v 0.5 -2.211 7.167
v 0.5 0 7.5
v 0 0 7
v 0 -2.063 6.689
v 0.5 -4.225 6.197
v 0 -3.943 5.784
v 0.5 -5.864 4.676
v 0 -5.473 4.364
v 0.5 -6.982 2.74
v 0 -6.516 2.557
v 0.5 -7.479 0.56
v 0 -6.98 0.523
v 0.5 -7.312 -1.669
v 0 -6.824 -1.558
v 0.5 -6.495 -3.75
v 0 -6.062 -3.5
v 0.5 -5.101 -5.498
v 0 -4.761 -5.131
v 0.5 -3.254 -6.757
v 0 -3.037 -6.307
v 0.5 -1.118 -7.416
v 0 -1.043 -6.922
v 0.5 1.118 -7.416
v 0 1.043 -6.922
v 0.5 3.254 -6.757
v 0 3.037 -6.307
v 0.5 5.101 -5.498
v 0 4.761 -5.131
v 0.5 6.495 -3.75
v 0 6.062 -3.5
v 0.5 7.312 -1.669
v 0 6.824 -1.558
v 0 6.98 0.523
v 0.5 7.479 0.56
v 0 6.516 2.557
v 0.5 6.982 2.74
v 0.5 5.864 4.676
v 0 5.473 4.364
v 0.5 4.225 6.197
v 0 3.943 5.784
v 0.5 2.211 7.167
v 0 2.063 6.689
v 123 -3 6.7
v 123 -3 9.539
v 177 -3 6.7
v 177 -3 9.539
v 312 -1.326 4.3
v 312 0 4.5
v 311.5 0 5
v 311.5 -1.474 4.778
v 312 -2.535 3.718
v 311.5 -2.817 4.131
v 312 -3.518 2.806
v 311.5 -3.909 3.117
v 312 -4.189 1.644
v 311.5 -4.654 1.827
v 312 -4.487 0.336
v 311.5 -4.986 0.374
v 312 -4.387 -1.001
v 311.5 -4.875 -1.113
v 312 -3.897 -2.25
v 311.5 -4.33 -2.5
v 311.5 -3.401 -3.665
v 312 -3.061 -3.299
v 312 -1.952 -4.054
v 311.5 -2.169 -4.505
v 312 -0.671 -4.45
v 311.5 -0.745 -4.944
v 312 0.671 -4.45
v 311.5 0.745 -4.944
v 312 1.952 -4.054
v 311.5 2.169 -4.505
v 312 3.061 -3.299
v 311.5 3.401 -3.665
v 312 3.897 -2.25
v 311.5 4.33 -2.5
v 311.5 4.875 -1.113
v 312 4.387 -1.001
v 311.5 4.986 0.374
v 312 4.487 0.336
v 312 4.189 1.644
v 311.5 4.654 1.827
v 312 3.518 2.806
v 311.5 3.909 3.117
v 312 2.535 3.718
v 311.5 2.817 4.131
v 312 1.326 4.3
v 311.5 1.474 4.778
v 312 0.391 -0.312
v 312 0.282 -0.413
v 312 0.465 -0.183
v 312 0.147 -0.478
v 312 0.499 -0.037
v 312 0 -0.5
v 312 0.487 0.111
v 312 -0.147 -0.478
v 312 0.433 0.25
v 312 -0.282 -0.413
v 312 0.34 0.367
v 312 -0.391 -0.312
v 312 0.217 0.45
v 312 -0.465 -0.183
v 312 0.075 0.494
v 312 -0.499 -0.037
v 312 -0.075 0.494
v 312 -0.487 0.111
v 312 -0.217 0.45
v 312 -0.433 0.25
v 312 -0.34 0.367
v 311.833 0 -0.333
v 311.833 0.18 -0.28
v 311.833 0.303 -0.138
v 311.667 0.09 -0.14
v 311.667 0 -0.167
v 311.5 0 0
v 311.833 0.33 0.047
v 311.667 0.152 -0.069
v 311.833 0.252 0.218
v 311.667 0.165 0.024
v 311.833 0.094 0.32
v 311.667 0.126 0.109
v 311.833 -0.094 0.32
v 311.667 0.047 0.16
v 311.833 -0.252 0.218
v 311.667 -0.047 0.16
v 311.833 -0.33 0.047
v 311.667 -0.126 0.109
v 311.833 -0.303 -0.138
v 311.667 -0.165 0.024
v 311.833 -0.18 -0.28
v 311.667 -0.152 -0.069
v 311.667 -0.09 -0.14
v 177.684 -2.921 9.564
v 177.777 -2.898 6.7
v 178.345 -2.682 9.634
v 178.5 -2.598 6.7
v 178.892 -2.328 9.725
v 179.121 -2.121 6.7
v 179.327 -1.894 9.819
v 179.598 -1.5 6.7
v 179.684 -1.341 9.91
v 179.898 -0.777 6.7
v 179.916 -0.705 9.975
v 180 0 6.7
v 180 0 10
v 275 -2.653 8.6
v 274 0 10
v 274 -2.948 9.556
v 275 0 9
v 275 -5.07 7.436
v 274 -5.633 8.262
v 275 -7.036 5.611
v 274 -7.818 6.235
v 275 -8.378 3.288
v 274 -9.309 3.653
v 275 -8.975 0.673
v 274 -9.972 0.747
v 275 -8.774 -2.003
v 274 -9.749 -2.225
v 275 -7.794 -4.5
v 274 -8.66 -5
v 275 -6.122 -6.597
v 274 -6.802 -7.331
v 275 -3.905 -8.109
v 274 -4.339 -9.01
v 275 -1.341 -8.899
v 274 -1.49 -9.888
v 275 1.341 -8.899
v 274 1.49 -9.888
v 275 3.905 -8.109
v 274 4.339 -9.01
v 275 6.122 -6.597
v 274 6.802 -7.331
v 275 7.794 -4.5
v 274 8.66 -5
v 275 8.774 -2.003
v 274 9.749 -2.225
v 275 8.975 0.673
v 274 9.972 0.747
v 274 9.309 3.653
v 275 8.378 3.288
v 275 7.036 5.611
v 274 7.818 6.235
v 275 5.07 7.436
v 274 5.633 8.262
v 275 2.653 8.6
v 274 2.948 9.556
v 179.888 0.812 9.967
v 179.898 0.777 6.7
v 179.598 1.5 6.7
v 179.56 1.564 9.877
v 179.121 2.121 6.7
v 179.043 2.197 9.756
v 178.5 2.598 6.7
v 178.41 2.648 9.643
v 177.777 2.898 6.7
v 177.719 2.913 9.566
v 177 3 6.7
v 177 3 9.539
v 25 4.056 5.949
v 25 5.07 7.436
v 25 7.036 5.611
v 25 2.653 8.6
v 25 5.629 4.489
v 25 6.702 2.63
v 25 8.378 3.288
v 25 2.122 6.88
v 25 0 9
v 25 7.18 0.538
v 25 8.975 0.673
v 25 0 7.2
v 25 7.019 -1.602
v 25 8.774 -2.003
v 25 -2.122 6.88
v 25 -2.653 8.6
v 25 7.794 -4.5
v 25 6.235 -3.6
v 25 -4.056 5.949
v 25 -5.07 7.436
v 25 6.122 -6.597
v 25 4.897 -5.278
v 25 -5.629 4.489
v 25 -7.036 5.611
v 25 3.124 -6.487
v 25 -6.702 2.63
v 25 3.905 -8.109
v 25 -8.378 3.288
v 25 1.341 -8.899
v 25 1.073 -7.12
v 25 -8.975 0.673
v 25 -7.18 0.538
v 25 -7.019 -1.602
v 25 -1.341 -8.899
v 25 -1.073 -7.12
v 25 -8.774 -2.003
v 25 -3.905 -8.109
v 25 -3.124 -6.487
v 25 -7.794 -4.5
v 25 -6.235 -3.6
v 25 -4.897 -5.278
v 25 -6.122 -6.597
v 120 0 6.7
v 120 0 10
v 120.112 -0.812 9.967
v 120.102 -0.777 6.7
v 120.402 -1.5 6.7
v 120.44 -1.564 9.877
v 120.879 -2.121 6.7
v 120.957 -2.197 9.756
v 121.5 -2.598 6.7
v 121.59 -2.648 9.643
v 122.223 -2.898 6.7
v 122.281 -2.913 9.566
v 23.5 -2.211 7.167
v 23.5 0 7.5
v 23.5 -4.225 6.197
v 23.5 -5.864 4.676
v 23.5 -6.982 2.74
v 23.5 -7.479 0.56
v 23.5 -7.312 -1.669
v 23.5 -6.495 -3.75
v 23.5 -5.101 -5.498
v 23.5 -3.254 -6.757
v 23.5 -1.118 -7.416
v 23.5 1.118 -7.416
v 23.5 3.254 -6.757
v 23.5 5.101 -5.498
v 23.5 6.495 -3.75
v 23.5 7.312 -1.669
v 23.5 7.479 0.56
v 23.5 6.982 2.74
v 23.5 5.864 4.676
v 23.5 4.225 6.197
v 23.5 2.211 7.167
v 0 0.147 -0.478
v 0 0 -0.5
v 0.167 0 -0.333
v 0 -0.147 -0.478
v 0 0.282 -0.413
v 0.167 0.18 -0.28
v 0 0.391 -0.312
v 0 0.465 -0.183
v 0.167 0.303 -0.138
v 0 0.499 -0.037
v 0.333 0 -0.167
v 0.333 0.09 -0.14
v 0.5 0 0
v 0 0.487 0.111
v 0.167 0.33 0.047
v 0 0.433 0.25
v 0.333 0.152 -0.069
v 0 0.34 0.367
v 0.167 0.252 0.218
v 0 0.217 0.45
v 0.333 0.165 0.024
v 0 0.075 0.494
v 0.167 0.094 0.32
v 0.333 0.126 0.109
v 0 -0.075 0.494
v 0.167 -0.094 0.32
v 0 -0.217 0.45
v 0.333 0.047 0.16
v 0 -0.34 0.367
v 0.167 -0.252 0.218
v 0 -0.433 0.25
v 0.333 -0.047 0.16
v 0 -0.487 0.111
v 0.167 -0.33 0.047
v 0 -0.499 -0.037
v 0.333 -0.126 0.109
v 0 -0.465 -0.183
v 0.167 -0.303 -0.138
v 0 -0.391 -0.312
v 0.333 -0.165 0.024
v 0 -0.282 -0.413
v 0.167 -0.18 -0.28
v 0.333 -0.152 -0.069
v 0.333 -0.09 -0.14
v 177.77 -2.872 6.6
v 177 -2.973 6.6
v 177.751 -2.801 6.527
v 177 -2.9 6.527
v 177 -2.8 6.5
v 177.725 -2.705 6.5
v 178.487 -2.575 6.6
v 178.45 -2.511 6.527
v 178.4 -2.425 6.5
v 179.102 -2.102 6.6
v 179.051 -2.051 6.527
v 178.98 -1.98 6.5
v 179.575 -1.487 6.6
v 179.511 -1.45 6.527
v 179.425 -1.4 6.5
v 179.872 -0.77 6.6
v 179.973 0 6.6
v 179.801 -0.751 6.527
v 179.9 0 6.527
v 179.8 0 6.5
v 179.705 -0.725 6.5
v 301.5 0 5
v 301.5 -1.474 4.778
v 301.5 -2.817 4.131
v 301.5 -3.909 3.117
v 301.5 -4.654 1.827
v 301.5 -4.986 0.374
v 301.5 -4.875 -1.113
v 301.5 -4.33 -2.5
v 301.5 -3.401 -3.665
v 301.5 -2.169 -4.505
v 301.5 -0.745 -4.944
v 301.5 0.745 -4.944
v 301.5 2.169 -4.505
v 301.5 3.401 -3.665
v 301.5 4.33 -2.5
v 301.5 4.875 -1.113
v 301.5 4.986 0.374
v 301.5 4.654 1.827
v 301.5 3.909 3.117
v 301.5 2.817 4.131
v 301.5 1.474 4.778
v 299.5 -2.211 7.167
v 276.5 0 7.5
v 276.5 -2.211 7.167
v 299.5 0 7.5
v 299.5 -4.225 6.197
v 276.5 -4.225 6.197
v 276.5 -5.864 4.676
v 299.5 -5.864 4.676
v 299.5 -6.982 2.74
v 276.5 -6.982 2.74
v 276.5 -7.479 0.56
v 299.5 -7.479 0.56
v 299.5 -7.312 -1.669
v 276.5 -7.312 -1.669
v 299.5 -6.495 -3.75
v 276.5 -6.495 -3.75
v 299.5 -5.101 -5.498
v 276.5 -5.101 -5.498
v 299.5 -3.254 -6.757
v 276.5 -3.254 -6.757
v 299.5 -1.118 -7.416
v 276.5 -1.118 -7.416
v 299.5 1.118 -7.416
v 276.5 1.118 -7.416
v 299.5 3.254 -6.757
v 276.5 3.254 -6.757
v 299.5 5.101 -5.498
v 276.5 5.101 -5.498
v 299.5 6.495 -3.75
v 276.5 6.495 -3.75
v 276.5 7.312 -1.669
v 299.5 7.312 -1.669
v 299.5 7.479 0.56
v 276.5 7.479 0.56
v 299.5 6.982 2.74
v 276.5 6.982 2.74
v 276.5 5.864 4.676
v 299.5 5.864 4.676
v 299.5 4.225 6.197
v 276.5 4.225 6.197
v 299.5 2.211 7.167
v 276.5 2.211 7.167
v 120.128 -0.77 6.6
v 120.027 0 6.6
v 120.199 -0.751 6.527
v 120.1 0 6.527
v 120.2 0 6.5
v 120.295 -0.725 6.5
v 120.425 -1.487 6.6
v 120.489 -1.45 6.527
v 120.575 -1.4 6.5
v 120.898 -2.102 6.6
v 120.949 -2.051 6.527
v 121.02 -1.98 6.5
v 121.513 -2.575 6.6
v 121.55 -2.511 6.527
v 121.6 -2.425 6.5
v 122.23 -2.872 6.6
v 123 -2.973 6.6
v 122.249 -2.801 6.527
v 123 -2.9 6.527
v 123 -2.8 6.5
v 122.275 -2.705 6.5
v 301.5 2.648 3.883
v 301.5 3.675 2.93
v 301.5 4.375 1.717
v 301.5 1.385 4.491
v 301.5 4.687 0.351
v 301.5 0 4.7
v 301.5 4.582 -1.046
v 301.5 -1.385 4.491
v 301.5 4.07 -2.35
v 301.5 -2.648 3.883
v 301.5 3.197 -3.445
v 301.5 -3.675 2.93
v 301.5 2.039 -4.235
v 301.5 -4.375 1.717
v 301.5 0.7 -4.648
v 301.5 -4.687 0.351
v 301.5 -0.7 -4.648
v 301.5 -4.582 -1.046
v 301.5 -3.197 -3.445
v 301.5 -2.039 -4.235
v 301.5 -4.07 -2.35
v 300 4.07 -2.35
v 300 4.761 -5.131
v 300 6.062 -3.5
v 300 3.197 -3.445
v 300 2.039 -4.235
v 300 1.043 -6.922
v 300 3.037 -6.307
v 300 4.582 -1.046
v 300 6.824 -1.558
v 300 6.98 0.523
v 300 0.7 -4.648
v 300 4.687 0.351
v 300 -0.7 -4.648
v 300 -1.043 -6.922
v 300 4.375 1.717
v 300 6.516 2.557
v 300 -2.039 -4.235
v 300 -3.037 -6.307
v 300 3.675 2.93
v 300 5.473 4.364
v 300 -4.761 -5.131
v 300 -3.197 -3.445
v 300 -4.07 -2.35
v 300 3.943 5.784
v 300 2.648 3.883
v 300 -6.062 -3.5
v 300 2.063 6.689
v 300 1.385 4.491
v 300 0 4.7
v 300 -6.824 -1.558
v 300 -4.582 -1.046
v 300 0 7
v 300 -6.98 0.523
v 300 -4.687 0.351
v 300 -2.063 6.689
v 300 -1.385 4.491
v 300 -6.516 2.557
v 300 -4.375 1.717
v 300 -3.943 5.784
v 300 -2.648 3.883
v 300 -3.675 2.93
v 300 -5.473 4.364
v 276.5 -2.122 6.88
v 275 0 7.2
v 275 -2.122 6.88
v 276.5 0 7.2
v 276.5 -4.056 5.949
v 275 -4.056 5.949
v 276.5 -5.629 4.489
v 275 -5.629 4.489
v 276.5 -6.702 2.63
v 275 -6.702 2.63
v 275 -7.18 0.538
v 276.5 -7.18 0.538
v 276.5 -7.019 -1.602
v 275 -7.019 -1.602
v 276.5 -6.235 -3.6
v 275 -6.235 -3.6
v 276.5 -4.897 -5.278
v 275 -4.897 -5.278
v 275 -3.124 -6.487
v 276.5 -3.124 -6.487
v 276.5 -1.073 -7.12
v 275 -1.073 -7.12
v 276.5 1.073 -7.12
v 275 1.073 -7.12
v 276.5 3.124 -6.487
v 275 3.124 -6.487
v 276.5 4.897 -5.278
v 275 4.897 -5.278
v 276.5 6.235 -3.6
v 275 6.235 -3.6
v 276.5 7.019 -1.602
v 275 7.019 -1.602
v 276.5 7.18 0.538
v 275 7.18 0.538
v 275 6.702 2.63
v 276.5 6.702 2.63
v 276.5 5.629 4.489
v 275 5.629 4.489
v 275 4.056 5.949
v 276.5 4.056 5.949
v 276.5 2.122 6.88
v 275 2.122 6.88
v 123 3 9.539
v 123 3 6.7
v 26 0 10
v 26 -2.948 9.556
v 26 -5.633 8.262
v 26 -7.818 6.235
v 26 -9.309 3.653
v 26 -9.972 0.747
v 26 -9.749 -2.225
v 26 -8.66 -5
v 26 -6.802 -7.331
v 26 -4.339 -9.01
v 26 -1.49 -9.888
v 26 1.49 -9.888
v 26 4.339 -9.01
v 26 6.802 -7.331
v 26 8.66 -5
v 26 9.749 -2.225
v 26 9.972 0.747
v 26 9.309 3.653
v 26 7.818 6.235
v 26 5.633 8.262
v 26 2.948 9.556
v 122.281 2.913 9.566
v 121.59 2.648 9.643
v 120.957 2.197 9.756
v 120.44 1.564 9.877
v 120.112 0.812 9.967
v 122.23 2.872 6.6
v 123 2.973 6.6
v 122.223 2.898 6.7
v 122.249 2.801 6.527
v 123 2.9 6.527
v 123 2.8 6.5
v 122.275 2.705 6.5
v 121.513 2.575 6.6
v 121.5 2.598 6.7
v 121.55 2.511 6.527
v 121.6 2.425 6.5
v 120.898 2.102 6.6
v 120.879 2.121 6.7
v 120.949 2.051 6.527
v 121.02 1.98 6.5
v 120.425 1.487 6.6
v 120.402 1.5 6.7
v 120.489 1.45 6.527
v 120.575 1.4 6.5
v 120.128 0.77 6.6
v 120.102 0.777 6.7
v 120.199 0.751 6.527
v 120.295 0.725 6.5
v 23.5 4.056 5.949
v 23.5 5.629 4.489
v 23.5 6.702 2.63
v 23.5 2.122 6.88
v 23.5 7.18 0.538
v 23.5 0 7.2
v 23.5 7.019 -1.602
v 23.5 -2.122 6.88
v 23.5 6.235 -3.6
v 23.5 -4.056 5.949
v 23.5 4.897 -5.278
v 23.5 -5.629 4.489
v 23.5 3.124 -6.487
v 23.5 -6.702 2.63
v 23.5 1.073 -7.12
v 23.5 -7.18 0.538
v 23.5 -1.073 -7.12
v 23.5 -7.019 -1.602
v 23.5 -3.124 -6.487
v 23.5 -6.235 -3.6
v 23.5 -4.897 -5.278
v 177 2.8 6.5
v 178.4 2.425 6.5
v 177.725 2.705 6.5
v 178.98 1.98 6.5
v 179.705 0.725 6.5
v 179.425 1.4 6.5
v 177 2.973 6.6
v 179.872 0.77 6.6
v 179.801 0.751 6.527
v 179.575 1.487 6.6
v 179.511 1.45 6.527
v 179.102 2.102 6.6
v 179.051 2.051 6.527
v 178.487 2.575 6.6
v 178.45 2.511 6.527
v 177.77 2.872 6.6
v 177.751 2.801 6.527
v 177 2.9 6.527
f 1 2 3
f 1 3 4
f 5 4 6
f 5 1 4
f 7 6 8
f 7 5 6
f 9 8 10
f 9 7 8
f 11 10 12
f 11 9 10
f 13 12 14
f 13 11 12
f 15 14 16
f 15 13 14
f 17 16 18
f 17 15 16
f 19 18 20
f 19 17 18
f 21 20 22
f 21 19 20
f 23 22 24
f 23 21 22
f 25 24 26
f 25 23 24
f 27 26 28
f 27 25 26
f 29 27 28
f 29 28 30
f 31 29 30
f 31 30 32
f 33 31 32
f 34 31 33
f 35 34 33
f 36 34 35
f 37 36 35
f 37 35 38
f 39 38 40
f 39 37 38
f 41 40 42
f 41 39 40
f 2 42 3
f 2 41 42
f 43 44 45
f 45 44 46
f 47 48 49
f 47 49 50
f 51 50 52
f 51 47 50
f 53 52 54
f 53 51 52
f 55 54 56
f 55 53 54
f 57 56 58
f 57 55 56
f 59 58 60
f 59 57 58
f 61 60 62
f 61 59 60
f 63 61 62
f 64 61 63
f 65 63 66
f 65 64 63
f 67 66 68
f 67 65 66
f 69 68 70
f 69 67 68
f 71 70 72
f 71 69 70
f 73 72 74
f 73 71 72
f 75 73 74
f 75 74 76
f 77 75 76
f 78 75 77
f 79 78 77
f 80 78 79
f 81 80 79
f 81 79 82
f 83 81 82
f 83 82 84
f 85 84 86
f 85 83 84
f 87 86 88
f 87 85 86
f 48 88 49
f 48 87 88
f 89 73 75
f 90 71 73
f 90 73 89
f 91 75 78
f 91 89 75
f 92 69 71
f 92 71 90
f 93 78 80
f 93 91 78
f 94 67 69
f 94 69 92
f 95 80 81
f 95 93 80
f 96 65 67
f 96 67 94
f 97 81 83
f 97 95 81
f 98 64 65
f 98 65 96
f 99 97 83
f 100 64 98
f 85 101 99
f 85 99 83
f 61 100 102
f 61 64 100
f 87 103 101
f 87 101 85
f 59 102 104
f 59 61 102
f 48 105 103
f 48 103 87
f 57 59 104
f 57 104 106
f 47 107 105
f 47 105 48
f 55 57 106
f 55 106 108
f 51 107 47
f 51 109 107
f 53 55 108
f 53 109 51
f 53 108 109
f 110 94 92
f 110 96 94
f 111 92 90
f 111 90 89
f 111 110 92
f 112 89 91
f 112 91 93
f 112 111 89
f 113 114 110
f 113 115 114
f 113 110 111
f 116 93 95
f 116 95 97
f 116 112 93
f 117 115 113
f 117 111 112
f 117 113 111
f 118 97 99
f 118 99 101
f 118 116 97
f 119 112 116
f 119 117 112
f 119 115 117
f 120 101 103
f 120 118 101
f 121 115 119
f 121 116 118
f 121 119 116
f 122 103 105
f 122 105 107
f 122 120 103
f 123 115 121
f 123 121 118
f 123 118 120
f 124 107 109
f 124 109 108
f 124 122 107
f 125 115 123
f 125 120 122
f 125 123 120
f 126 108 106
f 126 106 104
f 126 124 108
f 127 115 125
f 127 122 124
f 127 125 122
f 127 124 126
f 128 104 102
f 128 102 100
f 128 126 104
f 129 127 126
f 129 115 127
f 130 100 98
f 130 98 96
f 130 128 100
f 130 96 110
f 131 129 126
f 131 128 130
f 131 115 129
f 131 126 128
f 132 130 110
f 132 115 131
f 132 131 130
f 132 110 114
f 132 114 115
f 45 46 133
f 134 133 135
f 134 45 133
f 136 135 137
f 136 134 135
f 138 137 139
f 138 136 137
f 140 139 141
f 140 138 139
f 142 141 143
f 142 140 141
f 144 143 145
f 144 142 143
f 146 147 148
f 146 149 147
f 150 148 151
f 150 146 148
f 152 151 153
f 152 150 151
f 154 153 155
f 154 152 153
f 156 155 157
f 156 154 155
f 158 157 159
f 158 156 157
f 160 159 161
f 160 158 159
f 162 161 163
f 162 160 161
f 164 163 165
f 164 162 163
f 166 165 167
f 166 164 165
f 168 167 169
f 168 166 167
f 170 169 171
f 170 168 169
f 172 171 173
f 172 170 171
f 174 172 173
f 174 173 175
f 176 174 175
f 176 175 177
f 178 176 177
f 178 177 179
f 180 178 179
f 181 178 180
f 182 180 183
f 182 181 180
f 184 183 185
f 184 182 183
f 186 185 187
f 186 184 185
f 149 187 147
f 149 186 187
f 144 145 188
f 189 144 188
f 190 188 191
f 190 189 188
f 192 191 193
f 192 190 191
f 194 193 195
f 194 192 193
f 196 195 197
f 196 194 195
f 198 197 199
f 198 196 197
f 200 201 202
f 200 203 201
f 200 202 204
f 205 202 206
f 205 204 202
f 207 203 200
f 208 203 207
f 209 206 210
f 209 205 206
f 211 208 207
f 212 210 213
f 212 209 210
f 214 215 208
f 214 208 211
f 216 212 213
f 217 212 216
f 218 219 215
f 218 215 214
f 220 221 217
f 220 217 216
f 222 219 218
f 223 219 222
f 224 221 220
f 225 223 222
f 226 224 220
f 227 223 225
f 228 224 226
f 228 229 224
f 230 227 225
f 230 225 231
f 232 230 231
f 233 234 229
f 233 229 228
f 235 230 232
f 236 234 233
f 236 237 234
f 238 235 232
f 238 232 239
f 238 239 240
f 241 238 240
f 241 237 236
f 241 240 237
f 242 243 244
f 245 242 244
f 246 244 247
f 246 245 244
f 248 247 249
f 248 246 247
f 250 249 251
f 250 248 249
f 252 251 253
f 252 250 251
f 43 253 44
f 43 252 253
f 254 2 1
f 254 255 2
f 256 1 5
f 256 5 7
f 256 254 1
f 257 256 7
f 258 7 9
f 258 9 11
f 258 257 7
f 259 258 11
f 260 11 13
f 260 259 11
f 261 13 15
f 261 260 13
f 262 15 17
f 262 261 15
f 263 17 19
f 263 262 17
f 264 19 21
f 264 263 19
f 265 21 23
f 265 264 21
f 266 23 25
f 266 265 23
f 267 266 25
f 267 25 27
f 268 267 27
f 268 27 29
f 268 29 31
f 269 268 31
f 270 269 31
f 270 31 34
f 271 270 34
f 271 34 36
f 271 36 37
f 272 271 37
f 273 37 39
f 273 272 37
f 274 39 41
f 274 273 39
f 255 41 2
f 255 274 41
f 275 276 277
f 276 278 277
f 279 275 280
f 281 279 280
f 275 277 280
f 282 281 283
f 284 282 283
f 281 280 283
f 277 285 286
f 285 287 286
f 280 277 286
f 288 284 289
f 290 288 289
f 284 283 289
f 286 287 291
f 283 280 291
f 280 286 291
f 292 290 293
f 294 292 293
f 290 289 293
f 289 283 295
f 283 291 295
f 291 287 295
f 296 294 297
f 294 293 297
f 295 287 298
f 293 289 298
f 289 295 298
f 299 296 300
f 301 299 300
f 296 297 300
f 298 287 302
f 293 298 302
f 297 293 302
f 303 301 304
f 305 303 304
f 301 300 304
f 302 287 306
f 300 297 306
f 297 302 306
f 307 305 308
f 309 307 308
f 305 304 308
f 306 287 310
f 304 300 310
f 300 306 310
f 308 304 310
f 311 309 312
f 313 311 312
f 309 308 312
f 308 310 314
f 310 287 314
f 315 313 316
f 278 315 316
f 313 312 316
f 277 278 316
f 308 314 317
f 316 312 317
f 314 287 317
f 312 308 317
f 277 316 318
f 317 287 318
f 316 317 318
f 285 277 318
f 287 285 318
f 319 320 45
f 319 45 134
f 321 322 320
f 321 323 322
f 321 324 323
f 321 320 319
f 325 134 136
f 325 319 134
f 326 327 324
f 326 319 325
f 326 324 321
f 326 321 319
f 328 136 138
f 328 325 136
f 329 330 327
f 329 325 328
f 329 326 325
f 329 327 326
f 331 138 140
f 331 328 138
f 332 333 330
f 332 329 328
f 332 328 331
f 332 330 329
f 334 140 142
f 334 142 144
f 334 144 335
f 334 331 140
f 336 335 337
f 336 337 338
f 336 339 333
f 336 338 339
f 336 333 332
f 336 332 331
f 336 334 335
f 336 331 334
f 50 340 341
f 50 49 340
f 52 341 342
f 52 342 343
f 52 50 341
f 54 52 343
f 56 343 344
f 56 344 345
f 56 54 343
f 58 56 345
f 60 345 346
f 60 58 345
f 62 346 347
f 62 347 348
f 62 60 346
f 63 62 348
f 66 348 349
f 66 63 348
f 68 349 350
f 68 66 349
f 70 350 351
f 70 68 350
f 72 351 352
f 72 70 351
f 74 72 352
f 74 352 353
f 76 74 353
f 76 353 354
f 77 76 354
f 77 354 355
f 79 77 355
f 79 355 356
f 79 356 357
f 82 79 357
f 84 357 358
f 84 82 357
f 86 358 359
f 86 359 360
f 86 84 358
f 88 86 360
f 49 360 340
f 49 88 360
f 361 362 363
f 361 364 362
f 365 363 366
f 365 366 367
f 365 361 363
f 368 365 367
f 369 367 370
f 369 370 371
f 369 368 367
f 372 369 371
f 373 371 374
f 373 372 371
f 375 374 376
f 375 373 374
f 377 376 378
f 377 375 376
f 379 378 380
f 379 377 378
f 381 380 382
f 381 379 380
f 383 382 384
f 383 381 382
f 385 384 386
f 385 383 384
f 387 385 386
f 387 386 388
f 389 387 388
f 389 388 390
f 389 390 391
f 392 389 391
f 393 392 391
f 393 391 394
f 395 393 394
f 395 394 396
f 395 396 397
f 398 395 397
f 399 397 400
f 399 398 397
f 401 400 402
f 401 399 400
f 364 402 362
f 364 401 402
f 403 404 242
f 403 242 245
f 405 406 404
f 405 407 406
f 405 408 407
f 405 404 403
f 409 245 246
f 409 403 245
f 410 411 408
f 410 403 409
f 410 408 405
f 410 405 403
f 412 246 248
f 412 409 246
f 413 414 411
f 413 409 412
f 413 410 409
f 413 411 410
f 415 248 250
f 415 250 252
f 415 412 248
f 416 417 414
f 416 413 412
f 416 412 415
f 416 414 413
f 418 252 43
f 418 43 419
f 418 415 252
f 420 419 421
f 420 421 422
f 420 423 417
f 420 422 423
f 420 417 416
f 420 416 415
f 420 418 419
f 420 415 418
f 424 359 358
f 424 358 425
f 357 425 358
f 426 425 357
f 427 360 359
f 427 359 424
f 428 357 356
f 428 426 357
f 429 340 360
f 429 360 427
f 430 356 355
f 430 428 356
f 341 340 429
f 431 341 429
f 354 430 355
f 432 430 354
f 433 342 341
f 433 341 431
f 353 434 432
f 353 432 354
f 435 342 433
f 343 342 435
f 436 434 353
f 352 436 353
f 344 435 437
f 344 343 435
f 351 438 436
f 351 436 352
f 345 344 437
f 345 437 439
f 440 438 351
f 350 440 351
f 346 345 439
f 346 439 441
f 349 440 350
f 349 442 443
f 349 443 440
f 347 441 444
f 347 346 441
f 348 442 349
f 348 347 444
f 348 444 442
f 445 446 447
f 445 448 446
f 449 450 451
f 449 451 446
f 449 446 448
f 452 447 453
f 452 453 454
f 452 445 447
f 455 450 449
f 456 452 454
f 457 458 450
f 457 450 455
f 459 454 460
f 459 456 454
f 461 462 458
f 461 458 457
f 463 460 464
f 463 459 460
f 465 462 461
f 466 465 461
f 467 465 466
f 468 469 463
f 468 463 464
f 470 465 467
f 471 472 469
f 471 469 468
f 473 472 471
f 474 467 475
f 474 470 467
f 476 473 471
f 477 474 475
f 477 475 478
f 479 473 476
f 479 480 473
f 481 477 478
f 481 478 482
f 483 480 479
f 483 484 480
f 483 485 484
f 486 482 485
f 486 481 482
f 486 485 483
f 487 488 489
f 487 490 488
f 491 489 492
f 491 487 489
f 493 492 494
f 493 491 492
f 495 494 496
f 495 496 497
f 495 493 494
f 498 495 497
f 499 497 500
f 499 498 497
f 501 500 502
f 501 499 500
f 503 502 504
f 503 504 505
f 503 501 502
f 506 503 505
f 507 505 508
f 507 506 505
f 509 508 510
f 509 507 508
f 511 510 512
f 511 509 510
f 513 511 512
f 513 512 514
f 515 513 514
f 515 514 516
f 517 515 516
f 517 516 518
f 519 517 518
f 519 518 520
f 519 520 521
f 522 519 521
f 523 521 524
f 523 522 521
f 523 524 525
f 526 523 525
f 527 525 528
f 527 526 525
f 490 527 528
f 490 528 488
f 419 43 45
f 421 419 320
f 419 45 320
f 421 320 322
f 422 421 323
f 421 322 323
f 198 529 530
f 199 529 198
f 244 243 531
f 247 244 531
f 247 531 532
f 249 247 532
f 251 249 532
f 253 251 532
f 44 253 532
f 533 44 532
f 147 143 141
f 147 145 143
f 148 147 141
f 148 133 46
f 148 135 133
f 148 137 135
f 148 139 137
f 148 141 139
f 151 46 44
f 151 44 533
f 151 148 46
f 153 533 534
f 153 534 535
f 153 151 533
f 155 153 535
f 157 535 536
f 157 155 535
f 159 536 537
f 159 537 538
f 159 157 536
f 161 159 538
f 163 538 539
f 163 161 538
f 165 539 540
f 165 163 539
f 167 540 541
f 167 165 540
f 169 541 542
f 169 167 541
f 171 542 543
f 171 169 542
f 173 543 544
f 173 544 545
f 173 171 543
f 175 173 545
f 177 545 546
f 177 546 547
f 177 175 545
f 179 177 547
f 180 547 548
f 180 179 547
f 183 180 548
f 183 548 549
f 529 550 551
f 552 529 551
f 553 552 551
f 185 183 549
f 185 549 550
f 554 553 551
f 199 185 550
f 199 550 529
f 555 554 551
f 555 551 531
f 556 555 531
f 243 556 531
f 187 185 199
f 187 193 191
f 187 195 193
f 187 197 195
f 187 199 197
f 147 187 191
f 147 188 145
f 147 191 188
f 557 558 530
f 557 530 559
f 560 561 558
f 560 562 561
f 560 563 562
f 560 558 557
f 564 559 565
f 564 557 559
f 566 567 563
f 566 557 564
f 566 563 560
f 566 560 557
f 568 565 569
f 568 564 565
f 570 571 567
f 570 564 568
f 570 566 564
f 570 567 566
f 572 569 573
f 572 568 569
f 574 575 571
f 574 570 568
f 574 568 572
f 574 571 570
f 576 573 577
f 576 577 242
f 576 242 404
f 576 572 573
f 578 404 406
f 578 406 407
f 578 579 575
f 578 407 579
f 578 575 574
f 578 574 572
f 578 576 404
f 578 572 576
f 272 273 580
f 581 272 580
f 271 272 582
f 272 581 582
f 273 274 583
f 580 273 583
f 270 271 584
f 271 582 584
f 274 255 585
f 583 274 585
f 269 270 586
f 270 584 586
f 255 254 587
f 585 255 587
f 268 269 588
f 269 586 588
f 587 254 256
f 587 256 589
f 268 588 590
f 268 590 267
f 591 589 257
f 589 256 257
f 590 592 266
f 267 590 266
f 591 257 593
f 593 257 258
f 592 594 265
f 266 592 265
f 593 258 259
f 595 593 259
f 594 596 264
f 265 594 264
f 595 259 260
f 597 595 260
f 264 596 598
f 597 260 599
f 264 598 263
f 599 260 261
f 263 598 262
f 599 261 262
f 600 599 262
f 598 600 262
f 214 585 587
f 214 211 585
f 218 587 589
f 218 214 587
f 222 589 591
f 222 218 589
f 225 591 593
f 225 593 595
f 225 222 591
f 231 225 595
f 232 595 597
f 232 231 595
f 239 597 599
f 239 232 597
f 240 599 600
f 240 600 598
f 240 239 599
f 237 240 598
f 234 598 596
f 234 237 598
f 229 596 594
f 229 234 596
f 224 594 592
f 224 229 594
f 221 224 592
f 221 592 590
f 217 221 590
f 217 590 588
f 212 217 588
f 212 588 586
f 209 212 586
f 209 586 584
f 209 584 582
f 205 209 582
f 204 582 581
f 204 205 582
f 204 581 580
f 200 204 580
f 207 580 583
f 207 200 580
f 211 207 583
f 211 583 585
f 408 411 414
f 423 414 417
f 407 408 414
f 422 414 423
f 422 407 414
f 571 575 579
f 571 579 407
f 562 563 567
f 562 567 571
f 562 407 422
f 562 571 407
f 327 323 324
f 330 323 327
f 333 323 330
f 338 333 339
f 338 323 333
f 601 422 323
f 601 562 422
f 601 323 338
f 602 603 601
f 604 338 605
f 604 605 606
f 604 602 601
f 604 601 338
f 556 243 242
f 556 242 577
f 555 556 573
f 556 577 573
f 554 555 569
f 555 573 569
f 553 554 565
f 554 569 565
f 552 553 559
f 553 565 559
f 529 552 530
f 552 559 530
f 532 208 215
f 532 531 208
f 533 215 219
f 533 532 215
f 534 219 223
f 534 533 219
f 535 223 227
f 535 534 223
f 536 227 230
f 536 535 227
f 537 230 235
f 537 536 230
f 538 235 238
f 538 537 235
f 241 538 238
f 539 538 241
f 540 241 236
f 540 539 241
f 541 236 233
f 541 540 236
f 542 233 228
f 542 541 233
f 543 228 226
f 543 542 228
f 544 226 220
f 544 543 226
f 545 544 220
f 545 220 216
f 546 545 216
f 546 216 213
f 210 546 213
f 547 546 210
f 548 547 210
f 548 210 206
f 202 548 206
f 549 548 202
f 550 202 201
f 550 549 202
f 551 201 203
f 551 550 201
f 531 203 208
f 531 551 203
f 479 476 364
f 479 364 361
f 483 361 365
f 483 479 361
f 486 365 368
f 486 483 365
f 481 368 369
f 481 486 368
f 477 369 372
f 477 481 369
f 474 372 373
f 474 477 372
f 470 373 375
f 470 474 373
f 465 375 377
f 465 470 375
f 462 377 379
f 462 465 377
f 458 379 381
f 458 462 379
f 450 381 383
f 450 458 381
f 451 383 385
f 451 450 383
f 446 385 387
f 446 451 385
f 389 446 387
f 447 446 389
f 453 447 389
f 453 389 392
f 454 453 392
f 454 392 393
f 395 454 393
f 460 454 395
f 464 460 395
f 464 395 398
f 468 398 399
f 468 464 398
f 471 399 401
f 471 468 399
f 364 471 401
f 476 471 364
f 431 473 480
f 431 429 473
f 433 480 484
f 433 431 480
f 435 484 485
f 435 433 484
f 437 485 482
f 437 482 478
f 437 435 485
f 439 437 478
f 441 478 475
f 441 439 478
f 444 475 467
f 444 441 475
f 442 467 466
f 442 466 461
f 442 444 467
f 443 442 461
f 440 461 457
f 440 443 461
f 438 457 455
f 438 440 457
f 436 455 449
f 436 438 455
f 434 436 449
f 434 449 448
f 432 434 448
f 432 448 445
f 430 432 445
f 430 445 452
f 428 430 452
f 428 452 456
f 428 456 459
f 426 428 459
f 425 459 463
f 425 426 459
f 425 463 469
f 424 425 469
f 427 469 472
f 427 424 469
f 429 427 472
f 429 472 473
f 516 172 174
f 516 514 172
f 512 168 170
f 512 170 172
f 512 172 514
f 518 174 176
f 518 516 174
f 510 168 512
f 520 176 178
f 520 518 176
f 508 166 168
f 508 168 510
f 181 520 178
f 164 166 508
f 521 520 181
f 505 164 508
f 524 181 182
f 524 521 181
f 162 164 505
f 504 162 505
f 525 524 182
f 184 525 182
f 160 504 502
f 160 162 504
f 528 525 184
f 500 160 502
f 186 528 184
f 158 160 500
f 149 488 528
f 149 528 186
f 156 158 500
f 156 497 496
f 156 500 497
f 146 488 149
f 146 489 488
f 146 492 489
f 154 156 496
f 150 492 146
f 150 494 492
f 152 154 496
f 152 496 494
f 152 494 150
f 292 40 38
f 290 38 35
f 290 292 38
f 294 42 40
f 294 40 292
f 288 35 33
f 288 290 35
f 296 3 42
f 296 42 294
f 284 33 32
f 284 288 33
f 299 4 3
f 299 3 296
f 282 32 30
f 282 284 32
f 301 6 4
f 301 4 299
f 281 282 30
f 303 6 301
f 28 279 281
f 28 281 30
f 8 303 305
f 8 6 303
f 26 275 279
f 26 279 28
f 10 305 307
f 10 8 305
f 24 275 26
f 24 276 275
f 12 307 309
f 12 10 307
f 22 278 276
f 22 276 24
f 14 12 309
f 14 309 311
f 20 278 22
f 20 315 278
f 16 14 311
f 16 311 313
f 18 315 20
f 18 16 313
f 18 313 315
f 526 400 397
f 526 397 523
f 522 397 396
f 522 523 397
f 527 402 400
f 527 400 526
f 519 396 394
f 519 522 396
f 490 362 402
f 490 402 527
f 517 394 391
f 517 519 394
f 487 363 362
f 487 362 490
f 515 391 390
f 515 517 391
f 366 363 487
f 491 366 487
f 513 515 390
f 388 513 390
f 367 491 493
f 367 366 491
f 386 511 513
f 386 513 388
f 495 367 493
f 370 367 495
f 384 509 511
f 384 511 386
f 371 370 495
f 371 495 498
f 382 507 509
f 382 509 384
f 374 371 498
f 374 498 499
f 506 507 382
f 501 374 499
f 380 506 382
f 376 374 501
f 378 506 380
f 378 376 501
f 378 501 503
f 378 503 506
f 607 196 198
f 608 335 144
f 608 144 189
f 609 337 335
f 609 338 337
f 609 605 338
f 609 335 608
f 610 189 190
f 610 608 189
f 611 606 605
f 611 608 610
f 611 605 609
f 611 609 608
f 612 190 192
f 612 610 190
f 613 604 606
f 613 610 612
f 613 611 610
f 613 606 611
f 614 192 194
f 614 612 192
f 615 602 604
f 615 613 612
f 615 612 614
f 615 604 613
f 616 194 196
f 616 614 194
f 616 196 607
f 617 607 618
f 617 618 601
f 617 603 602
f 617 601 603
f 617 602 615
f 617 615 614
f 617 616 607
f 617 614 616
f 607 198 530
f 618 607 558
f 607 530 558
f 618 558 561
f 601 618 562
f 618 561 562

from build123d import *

# Parameters (mm, degrees)
CHAMFER1_SIZE      = 0.5
SKETCH3_W          = 1.5
SKETCH3_H          = 0.3
SKETCH9_W          = 60
SKETCH9_H          = 6
CUT_EXTRUDE2_DEPTH = 3.5
FILLET4_R          = 3
FILLET5_R          = 3
FILLET6_R          = 0.2


with BuildPart() as part:
    # Sketch1 → Revolve1 (revolve)
    with BuildSketch(Plane.XY, mode=Mode.PRIVATE) as revolve1_sk:
        Polygon((0, 0), (0, 7.5), (25, 7.5), (25, 9), (26, 10), (274, 10), (275, 9), (275, 7.5), (300, 7.5), (300, 5), (312, 5), (312, 0), align=None)
    revolve(revolve1_sk.sketch.rotate(Axis((0, 0, 0), (1, 0, 0)), 90), axis=Axis((0, 0, 0), (1, 0, 0)))

    # Chamfer1
    chamfer1_edges = [part.edges().sort_by_distance(p)[0] for p in [
        (300, 0, -7.5),
        (312, 0, -5),
        (0, 0, -7.5),
    ]]
    chamfer(chamfer1_edges, length=CHAMFER1_SIZE)

    # Sketch2 → Cut-Revolve1 (revolve, cut)
    with BuildSketch(Plane.XY, mode=Mode.PRIVATE) as cut_revolve1_sk:
        Polygon((0, 0), (0, 0.5), (0.5, 0), align=None)
        Polygon((312, 0), (312, 0.5), (311.5, 0), align=None)
    revolve(cut_revolve1_sk.sketch.rotate(Axis((0, 0, 0), (1, 0, 0)), 270), axis=Axis((0, 0, 0), (1, 0, 0)), mode=Mode.SUBTRACT)

    # Sketch3 → Cut-Revolve2 (revolve, cut)
    with BuildSketch(Plane.XY, mode=Mode.PRIVATE) as cut_revolve2_sk:
        with Locations((24.25, 7.35)):
            Rectangle(SKETCH3_W, SKETCH3_H)
        with Locations((275.75, 7.35)):
            Rectangle(SKETCH3_W, SKETCH3_H)
        with Locations((300.75, 4.85)):
            Rectangle(SKETCH3_W, SKETCH3_H)
    revolve(cut_revolve2_sk.sketch.rotate(Axis((0, 0, 0), (1, 0, 0)), 90), axis=Axis((0, 0, 0), (1, 0, 0)), mode=Mode.SUBTRACT)

    # Sketch9 → Cut-Extrude2 (cut)
    with BuildSketch(Plane.XY.offset(10)):
        with Locations((150, 0)):
            Rectangle(SKETCH9_W, SKETCH9_H)
    extrude(amount=-CUT_EXTRUDE2_DEPTH, mode=Mode.SUBTRACT)

    # Fillet4
    fillet4_edges = [part.edges().sort_by_distance(p)[0] for p in [
        (120, 3, 8.019696007),
        (120, -3, 8.019696007),
    ]]
    fillet(fillet4_edges, radius=FILLET4_R - 0.0001)  # a hair under: the kernel refuses the full size

    # Fillet5
    fillet5_edges = [part.edges().sort_by_distance(p)[0] for p in [
        (180, 3, 8.019696007),
        (180, -3, 8.019696007),
    ]]
    fillet(fillet5_edges, radius=FILLET5_R - 0.0001)  # a hair under: the kernel refuses the full size

    # Fillet6
    fillet6_edges = [part.edges().sort_by_distance(p)[0] for p in [
        (150, -3, 6.5),
        (120.878650367, -2.121349633, 6.5),
        (120.878650367, 2.121349633, 6.5),
        (150, 3, 6.5),
        (179.121349633, -2.121349633, 6.5),
        (179.121349633, 2.121349633, 6.5),
    ]]
    fillet(fillet6_edges, radius=FILLET6_R)


solid = part.part
